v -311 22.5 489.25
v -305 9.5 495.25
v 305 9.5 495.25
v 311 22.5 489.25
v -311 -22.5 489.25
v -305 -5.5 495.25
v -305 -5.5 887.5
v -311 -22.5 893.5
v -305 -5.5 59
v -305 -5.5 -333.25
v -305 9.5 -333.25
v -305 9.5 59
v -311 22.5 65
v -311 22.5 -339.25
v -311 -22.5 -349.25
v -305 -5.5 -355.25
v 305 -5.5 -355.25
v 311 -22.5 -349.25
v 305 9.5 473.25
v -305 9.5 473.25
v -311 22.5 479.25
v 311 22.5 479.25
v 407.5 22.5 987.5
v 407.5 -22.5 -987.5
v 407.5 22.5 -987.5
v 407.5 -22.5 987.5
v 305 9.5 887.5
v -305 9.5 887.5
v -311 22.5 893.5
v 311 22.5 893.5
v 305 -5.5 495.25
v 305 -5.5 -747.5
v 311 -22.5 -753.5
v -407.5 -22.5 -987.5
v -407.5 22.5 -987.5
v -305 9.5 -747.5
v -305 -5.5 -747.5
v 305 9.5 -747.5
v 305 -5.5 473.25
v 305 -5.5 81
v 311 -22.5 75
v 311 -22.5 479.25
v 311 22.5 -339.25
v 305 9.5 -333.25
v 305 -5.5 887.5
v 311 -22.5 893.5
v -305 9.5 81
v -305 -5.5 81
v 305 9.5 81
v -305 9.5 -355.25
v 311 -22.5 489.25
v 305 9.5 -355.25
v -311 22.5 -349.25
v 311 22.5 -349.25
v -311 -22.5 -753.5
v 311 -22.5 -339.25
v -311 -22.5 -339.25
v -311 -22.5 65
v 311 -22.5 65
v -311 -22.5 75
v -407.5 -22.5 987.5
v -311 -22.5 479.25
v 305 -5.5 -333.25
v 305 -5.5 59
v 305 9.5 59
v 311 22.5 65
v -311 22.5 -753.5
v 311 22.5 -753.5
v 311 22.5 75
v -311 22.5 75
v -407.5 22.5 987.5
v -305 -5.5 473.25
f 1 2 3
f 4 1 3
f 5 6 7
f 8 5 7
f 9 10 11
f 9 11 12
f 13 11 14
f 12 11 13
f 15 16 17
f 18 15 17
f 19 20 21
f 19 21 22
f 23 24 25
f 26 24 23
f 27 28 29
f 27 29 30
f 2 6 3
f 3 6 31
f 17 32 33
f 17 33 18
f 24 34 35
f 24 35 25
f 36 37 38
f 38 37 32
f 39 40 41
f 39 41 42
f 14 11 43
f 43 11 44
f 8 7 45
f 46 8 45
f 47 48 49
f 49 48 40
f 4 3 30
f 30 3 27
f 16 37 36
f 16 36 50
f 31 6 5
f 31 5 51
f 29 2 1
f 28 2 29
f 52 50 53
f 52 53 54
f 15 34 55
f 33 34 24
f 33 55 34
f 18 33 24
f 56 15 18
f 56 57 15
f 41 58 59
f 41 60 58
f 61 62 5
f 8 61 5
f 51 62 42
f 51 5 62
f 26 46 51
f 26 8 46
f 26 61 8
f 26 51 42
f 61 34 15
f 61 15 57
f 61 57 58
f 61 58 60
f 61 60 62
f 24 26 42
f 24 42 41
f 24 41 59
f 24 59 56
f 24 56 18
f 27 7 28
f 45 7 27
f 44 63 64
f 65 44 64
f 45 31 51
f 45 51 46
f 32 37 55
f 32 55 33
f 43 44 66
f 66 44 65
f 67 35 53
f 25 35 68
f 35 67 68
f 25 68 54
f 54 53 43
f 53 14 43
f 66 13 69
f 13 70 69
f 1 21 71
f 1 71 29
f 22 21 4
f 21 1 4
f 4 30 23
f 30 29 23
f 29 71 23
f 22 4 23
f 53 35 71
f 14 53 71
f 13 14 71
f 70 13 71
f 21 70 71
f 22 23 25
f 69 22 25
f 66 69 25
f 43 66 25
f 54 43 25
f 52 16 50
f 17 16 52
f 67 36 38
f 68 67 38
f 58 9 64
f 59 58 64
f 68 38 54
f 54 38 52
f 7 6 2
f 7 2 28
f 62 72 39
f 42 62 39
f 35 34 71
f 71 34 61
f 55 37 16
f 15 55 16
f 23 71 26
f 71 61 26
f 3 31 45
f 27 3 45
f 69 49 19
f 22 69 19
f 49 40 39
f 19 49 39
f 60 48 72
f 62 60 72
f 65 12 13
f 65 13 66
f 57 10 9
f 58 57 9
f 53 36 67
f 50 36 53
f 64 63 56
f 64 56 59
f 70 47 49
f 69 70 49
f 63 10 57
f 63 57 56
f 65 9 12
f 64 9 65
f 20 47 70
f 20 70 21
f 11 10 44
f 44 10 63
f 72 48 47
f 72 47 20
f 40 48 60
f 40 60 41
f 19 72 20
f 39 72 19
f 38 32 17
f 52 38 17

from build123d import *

# Parameters (mm, degrees)
F0_W     = 815
F0_H     = 1975
F0_W_2   = 610
F0_H_2   = 392.25
F1_DEPTH = 22.5
F2_SIZE2 = 17
F2_SIZE  = 6
F3_SIZE2 = 13
F3_SIZE  = 6


with BuildPart() as f1:
    # F0 (on Front) → F1 (new body, symmetric)
    with BuildSketch(Plane.XZ):
        Rectangle(F0_W, F0_H)
        with Locations((0, -551.375)):
            Rectangle(F0_W_2, F0_H_2, mode=Mode.SUBTRACT)
        with Locations((0, -137.125)):
            Rectangle(F0_W_2, F0_H_2, mode=Mode.SUBTRACT)
        with Locations((0, 277.125)):
            Rectangle(F0_W_2, F0_H_2, mode=Mode.SUBTRACT)
        with Locations((0, 691.375)):
            Rectangle(F0_W_2, F0_H_2, mode=Mode.SUBTRACT)
    extrude(amount=F1_DEPTH, both=True)

    # F2
    f2_edges = [f1.edges().sort_by_distance(p)[0] for p in [
        (305, -22.5, -551.375),
        (0, -22.5, -355.25),
        (305, -22.5, -137.125),
        (0, -22.5, 59),
        (305, -22.5, 277.125),
        (0, -22.5, 473.25),
        (305, -22.5, 691.375),
        (0, -22.5, 887.5),
        (-305, -22.5, 691.375),
        (0, -22.5, 495.25),
        (-305, -22.5, 277.125),
        (0, -22.5, 81),
        (-305, -22.5, -137.125),
        (0, -22.5, -333.25),
        (-305, -22.5, -551.375),
        (0, -22.5, -747.5),
    ]]
    f2_side = f1.faces().sort_by_distance((0, -22.5, 966.13449))[0]
    chamfer(f2_edges, length=F2_SIZE, length2=F2_SIZE2, reference=f2_side)

    # F3
    f3_edges = [f1.edges().sort_by_distance(p)[0] for p in [
        (0, 22.5, -747.5),
        (305, 22.5, -551.375),
        (0, 22.5, -355.25),
        (-305, 22.5, -551.375),
        (-305, 22.5, -137.125),
        (0, 22.5, 59),
        (-305, 22.5, 277.125),
        (0, 22.5, -333.25),
        (305, 22.5, -137.125),
        (0, 22.5, 81),
        (305, 22.5, 277.125),
        (0, 22.5, 473.25),
        (305, 22.5, 691.375),
        (0, 22.5, 887.5),
        (-305, 22.5, 691.375),
        (0, 22.5, 495.25),
    ]]
    f3_side = f1.faces().sort_by_distance((0, 22.5, 966.13449))[0]
    chamfer(f3_edges, length=F3_SIZE, length2=F3_SIZE2, reference=f3_side)


solid = f1.part
